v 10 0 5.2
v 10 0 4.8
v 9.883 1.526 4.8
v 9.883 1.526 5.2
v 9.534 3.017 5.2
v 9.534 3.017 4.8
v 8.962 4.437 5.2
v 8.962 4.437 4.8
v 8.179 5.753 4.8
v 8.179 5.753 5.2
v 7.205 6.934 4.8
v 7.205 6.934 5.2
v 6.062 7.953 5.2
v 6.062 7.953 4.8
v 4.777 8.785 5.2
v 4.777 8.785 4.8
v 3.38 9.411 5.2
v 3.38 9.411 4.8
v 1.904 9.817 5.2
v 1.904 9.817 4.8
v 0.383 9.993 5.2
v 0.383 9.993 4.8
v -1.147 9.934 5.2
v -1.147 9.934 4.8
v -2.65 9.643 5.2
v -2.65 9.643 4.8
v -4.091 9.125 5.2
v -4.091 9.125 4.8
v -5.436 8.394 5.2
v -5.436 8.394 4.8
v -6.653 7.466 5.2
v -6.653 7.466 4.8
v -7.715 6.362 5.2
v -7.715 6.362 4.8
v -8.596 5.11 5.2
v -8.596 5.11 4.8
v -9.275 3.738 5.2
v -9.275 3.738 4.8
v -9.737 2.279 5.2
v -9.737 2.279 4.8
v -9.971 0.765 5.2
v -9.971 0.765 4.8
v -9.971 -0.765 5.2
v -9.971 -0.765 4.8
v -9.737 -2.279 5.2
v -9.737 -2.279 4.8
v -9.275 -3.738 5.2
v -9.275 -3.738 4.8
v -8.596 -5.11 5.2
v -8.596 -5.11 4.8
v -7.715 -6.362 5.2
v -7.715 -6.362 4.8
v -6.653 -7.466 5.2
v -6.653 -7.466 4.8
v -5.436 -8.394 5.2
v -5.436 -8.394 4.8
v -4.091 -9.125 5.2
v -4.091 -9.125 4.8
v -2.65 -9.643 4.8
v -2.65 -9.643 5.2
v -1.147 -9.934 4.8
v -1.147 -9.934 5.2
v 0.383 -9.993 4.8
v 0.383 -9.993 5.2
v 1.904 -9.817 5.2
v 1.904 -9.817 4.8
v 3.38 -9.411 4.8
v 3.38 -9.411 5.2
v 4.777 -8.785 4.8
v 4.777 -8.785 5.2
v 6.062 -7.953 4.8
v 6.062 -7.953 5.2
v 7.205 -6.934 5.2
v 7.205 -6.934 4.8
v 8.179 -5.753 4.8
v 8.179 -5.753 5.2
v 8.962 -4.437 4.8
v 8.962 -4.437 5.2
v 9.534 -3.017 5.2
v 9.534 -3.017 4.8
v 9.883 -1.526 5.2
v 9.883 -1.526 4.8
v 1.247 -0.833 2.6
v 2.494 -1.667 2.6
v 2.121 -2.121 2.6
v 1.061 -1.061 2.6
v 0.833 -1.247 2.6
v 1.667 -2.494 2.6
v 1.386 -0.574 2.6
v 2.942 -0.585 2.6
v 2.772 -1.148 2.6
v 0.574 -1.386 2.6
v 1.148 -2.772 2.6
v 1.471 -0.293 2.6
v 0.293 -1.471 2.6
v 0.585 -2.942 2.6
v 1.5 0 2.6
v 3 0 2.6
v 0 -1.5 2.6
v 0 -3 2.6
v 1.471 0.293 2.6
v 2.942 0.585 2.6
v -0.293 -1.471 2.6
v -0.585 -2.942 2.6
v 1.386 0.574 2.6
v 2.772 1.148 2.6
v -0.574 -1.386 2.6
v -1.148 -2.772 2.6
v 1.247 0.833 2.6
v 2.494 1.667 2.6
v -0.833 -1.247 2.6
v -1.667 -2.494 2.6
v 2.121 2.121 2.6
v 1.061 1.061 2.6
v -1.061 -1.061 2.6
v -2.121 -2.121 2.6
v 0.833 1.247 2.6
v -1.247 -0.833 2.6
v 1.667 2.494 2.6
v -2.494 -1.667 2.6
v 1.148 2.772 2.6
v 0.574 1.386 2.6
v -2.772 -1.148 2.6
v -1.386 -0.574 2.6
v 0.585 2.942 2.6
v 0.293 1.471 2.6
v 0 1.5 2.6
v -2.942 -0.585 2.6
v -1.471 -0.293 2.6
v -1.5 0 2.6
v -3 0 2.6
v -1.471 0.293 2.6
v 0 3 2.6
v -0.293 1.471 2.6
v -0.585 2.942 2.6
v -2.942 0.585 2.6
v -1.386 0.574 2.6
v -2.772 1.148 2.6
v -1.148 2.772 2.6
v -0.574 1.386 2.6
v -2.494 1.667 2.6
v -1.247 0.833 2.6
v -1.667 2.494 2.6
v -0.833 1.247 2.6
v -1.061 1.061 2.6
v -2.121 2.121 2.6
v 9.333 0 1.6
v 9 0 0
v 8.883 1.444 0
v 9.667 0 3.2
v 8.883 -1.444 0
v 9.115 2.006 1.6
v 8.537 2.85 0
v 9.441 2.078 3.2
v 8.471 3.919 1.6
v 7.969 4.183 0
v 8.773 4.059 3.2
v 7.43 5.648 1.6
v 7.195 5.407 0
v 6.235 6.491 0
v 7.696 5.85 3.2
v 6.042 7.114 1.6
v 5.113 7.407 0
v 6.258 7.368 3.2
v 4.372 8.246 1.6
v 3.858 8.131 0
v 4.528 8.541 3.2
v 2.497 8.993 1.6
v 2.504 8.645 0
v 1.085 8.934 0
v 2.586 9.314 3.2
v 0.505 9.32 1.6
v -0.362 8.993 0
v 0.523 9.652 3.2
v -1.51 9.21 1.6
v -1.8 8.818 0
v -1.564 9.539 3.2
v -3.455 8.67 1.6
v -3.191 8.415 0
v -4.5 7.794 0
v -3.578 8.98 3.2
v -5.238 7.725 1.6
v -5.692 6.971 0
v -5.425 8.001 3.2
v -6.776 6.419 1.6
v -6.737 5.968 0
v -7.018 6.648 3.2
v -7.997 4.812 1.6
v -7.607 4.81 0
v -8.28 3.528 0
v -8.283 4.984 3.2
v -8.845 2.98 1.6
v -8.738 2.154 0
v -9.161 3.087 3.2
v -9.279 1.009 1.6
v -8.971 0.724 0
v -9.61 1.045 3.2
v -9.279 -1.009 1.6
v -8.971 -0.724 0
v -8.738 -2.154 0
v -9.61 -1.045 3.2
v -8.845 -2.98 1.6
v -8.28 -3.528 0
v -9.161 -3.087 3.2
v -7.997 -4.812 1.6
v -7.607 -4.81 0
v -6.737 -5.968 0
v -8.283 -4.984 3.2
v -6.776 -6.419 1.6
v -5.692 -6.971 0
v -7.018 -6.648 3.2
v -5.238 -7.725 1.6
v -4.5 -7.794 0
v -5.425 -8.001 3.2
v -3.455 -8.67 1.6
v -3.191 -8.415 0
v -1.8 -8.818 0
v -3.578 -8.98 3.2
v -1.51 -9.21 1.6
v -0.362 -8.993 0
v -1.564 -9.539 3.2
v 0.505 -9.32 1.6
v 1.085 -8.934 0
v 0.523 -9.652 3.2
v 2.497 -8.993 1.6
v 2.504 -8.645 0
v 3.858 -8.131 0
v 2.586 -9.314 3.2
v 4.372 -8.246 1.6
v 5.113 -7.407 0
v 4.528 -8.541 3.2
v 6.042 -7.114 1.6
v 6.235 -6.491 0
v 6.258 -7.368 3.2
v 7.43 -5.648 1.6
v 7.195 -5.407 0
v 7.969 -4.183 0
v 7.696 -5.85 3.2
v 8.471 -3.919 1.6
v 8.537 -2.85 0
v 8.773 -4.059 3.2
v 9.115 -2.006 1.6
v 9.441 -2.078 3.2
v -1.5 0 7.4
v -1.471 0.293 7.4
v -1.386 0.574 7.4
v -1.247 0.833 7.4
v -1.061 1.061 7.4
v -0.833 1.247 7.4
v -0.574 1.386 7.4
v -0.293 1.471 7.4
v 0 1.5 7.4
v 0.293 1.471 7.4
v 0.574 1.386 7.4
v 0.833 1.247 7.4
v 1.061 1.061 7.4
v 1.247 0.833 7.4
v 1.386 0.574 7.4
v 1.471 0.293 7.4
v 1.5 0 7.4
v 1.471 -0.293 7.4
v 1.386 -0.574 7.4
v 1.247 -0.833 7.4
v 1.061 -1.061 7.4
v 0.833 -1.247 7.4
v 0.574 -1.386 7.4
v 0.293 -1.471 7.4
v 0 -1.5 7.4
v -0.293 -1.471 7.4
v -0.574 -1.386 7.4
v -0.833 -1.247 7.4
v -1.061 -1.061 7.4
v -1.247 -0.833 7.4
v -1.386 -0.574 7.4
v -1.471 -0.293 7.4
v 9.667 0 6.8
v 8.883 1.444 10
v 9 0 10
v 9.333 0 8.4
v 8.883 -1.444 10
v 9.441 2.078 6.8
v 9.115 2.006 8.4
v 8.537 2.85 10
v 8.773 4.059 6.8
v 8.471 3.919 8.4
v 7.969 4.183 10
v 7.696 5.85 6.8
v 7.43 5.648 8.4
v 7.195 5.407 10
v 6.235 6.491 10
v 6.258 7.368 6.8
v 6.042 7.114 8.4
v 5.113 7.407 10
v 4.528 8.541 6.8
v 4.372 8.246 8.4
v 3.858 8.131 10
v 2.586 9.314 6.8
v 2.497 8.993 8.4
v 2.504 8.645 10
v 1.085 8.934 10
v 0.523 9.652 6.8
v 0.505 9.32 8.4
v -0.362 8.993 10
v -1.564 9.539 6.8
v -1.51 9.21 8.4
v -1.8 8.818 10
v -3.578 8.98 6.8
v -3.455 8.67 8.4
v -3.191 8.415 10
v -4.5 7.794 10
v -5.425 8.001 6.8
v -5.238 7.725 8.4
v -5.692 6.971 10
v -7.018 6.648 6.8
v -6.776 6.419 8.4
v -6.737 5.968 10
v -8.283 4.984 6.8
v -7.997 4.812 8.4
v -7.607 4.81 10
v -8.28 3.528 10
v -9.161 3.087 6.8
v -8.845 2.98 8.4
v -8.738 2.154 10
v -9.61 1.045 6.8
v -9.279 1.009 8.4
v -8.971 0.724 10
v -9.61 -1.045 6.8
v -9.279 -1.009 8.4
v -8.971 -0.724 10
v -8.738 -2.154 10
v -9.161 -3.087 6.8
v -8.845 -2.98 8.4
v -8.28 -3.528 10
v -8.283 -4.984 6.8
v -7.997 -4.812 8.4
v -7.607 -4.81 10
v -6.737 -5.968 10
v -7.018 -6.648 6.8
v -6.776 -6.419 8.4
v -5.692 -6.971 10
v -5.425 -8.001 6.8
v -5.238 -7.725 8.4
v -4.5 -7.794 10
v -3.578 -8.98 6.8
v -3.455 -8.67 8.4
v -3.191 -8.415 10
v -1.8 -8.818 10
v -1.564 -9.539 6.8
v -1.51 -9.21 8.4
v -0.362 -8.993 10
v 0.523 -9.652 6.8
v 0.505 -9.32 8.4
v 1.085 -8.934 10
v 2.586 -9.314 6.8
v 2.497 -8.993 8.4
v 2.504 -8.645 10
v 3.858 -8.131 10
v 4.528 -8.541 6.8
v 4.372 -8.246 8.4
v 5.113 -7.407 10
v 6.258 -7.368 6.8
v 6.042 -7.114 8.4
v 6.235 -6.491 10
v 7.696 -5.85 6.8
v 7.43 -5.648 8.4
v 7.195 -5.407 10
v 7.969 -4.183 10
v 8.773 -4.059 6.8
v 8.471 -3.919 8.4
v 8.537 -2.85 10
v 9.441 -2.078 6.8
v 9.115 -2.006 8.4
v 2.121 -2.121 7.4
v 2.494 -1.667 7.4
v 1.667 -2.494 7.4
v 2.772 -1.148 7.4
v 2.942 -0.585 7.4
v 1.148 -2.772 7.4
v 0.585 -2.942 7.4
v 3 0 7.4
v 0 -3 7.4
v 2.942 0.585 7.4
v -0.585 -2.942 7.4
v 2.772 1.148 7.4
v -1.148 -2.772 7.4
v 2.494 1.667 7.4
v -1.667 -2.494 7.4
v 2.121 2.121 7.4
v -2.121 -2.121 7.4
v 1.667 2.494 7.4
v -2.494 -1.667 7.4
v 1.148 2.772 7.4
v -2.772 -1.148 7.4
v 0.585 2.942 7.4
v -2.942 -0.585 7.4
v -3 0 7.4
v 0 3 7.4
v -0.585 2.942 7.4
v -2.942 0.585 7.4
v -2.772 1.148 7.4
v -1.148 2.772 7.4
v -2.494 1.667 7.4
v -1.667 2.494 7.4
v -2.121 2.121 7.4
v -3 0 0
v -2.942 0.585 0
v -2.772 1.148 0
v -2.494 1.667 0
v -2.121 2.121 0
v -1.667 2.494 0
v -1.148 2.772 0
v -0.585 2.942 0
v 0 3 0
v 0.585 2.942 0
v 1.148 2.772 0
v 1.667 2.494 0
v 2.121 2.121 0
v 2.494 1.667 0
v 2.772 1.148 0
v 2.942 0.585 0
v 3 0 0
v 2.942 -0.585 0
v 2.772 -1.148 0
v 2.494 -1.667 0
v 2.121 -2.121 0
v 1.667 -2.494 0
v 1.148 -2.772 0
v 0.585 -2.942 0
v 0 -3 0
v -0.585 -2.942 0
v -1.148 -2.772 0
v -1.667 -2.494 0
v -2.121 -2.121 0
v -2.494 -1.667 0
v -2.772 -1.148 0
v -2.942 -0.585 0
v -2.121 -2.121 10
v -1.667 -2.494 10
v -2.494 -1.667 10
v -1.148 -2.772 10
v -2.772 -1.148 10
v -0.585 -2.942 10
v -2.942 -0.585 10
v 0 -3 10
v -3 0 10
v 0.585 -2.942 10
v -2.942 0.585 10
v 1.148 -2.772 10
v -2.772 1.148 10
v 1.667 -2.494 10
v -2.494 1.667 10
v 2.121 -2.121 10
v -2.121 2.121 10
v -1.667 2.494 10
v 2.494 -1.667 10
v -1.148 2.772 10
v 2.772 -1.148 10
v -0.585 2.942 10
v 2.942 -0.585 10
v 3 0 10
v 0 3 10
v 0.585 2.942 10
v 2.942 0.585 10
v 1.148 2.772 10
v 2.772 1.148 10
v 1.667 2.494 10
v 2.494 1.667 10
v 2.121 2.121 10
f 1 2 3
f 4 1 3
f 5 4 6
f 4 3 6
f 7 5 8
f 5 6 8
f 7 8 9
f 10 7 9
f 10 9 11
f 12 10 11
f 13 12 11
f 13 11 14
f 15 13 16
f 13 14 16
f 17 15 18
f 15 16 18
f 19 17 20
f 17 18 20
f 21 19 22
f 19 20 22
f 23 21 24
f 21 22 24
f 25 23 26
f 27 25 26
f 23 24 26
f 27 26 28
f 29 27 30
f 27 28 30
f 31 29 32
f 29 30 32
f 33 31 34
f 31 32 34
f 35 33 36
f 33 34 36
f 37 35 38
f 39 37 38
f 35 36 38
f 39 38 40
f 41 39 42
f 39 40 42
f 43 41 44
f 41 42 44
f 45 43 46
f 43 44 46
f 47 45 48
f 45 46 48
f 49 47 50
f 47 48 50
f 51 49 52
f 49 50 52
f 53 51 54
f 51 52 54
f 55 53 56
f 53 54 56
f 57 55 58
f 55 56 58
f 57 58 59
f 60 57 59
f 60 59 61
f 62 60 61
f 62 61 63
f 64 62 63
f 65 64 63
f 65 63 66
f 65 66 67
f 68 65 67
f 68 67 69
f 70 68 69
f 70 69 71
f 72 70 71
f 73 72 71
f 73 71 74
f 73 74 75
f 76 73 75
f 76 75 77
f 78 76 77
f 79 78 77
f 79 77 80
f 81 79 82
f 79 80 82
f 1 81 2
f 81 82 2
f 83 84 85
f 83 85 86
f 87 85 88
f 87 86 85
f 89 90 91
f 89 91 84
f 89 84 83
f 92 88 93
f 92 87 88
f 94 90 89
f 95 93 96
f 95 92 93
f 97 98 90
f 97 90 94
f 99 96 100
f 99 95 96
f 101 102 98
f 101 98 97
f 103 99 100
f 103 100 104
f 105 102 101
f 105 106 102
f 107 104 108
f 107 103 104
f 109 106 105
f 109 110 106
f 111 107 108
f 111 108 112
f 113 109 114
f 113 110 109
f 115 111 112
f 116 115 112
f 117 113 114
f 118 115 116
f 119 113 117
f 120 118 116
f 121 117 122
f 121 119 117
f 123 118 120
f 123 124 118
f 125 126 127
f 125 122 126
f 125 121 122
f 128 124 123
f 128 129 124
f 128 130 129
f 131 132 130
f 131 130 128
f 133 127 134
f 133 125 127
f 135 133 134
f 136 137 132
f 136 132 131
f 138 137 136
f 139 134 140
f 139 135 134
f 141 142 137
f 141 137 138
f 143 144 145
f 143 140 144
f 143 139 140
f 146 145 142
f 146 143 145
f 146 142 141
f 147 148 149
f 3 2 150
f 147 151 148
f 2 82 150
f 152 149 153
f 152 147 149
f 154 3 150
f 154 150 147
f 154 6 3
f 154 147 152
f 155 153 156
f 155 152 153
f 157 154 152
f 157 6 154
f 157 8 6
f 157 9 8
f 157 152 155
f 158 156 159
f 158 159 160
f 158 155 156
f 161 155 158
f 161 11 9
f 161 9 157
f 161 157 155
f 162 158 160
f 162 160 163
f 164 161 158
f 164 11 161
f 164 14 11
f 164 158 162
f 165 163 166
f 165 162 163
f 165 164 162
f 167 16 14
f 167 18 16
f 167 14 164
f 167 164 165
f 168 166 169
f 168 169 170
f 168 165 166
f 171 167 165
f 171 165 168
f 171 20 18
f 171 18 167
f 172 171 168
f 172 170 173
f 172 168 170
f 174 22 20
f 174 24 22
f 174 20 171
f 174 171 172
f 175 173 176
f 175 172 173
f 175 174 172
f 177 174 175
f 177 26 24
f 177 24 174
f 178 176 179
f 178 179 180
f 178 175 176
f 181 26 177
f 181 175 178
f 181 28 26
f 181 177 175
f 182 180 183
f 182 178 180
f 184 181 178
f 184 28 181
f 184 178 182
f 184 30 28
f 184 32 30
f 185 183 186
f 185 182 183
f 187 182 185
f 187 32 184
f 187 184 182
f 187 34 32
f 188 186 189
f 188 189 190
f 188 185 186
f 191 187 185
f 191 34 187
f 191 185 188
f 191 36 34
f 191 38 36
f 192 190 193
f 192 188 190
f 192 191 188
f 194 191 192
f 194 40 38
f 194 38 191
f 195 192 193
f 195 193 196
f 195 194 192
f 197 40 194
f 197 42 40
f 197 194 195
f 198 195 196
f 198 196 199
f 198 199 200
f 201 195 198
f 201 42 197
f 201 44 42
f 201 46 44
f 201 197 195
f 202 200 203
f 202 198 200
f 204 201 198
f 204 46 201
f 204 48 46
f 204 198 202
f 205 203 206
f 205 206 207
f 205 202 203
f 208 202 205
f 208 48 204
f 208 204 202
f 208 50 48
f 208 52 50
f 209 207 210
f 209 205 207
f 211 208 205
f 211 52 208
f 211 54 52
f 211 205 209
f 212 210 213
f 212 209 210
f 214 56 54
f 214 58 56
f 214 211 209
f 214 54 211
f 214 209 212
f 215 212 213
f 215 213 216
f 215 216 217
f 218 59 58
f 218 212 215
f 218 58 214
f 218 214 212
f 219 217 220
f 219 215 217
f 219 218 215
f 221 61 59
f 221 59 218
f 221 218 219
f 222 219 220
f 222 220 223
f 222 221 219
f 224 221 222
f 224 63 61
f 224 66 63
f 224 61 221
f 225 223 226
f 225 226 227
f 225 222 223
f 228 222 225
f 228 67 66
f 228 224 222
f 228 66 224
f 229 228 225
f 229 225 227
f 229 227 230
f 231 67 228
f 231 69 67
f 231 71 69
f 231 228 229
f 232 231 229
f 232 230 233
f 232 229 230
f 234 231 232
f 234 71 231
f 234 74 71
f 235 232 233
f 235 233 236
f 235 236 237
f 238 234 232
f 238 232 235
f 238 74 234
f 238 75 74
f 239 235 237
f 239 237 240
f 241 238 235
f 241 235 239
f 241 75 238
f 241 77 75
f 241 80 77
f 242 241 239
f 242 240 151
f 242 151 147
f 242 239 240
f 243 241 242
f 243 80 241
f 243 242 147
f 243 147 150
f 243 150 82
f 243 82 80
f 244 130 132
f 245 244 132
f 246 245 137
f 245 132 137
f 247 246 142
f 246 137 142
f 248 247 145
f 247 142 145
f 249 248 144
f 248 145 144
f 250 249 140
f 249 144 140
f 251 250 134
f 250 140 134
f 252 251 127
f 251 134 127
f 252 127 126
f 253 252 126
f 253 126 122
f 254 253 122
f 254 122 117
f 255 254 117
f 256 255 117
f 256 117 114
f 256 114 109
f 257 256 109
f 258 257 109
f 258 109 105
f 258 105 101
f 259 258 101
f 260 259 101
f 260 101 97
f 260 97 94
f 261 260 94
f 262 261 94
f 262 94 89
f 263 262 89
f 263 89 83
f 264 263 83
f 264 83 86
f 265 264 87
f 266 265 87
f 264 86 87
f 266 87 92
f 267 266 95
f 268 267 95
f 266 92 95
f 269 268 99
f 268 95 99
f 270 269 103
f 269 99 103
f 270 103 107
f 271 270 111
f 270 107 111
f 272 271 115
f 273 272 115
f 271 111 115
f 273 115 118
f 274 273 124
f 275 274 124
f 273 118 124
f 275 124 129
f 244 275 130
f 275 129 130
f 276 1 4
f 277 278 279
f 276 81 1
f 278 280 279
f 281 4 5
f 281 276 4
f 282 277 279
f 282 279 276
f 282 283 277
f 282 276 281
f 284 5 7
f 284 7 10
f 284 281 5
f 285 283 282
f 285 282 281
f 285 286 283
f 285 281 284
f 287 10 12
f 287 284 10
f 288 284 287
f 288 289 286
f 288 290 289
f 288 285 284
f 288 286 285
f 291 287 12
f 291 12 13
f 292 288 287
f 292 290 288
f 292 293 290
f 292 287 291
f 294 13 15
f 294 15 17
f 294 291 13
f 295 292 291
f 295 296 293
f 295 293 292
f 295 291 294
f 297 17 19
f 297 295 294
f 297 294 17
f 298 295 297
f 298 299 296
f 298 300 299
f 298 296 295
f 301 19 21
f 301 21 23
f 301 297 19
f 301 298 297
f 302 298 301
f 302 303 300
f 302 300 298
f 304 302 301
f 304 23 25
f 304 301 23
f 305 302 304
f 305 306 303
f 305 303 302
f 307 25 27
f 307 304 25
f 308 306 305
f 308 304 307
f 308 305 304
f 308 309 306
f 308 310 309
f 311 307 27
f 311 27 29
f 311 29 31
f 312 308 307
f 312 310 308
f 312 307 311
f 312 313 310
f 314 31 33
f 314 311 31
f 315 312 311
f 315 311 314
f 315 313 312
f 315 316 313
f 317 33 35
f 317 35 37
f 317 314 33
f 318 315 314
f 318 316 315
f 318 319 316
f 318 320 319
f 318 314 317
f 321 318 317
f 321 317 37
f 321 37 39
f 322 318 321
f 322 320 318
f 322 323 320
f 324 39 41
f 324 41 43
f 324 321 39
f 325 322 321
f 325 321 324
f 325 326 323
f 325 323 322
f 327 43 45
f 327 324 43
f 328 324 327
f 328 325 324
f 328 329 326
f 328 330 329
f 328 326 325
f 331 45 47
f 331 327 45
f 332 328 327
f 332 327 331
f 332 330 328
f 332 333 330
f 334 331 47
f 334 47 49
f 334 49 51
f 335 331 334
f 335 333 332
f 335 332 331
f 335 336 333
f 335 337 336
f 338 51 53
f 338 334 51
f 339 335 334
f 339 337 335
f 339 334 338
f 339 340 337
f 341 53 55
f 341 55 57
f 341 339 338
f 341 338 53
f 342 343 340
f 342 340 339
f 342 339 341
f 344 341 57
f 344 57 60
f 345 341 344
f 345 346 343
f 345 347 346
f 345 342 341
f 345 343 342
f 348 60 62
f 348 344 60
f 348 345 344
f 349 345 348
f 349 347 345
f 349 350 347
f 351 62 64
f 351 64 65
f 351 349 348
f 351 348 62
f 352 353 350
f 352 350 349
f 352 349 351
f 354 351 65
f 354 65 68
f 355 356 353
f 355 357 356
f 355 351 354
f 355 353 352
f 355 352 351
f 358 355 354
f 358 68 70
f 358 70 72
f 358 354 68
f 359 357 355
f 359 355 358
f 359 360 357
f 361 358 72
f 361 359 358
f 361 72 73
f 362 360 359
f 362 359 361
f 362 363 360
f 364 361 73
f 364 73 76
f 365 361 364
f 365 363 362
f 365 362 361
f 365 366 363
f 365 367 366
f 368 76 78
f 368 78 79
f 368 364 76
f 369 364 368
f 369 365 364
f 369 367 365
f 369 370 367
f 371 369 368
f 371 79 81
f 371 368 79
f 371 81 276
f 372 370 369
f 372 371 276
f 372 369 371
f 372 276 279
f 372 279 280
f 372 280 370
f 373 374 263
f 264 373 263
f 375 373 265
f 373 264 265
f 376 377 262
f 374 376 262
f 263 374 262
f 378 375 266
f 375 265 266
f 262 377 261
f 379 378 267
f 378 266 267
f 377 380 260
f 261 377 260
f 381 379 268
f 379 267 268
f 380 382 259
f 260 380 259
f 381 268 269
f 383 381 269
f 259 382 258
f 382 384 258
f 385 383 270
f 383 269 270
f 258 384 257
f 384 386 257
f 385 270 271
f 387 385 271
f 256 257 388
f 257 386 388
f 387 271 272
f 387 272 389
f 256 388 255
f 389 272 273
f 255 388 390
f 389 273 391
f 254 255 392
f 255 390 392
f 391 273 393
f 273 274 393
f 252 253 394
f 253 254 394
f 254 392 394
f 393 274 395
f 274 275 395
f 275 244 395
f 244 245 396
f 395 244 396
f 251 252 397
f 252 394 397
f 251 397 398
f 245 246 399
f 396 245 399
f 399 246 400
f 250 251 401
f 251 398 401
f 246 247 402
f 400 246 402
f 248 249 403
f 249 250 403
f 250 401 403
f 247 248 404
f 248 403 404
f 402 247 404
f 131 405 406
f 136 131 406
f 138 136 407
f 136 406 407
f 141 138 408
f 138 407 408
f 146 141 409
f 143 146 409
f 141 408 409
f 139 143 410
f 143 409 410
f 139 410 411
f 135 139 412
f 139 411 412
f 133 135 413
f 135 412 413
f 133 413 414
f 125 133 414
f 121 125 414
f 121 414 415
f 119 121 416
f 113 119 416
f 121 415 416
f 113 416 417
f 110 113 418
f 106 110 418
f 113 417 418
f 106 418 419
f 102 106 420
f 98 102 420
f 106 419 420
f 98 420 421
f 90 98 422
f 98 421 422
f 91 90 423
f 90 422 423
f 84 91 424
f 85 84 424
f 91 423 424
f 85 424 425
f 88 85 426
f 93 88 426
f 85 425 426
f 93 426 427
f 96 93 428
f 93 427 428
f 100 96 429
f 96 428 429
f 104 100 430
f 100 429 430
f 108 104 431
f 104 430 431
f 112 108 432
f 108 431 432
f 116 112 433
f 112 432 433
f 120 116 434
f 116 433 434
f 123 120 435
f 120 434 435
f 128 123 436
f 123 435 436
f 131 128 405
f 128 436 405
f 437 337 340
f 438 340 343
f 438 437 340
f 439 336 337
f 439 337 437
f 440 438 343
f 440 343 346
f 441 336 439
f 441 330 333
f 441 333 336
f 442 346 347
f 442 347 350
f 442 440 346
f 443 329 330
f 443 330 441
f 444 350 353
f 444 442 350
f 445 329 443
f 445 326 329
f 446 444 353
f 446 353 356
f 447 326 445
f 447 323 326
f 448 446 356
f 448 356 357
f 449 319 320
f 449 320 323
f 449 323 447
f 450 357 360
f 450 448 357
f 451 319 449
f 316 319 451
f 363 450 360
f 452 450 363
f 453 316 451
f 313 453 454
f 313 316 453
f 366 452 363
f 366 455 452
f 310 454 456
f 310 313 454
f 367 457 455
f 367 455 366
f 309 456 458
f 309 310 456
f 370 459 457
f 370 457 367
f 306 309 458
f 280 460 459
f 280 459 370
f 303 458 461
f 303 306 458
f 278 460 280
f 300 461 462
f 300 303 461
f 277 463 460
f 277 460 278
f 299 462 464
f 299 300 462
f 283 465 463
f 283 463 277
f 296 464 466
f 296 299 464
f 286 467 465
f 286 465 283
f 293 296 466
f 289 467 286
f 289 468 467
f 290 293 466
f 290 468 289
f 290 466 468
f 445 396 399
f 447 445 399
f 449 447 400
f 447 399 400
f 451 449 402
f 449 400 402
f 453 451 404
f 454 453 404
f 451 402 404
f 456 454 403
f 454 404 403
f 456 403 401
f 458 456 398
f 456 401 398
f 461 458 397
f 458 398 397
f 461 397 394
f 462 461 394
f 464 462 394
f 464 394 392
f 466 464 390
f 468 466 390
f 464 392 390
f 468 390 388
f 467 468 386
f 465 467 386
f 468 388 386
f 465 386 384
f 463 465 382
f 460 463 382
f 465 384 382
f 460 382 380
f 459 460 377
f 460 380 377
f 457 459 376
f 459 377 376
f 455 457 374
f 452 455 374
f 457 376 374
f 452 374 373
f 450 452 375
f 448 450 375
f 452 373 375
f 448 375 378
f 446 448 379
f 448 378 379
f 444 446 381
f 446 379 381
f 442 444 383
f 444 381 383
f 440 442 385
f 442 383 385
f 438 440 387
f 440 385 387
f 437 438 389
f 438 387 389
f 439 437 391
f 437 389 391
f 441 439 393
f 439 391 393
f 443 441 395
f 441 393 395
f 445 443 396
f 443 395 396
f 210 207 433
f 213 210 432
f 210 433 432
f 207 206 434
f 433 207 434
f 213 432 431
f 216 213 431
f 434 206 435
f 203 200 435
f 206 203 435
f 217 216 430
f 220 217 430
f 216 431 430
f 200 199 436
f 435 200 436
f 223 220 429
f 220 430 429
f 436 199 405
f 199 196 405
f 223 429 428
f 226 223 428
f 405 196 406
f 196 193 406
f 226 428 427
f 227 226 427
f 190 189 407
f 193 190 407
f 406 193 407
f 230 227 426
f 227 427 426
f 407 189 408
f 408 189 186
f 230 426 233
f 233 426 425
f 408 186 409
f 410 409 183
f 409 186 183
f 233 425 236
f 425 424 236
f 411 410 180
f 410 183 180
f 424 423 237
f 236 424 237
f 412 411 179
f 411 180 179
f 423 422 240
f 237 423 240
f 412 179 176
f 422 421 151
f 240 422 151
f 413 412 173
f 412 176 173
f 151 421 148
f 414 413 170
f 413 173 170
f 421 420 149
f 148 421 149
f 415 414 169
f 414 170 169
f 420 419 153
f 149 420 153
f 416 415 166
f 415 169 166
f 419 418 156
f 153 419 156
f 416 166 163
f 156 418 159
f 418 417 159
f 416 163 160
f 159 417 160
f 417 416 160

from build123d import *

# Parameters (mm, degrees)
SKETCH_1_R          = 10
EXTRUDE_1_DEPTH     = 10
CHAMFER_1_SIZE      = 1
CHAMFER_1_SIZE2     = 4.8
CHAMFER_2_SIZE      = 4.8
CHAMFER_2_SIZE2     = 1
SKETCH_2_R          = 3
CUT_EXTRUDE_1_DEPTH = 2.6
CUT_EXTRUDE_START   = -7.4
SKETCH_2_3_R        = 3
CUT_EXTRUDE_2_DEPTH = 2.6
SKETCH_4_R          = 1.5
CUT_EXTRUDE_3_DEPTH = 16.961202962


with BuildPart() as part:
    # 草图1 → 凸台-拉伸1 (new body)
    with BuildSketch(Plane.XY):
        Circle(SKETCH_1_R)
    extrude(amount=EXTRUDE_1_DEPTH)

    # 倒角1
    chamfer_1_edges = [part.edges().sort_by_distance(p)[0] for p in [
        (-10, 0, 0),
    ]]
    chamfer_1_side = [part.faces().sort_by_distance(p)[0] for p in [
        (0, 0, 0),
    ]]
    chamfer(chamfer_1_edges, length=CHAMFER_1_SIZE, length2=CHAMFER_1_SIZE2, reference=chamfer_1_side[0])

    # 倒角2
    chamfer_2_edges = [part.edges().sort_by_distance(p)[0] for p in [
        (-10, 0, 10),
    ]]
    chamfer_2_side = [part.faces().sort_by_distance(p)[0] for p in [
        (-10, 0, 7.4),
    ]]
    chamfer(chamfer_2_edges, length=CHAMFER_2_SIZE, length2=CHAMFER_2_SIZE2, reference=chamfer_2_side[0])

    # 草图2 → 切除-拉伸1 (cut)
    with BuildSketch(Plane(origin=(0, 0, 0), x_dir=(-1, 0, 0), z_dir=(0, 0, -1))):
        Circle(SKETCH_2_R)
    extrude(amount=-CUT_EXTRUDE_1_DEPTH, mode=Mode.SUBTRACT)

    # 草图2<3> → 切除-拉伸2 (cut)
    with BuildSketch(Plane(origin=(0, 0, 0), x_dir=(-1, 0, 0), z_dir=(0, 0, -1)).offset(CUT_EXTRUDE_START)):
        Circle(SKETCH_2_3_R)
    extrude(amount=-CUT_EXTRUDE_2_DEPTH, mode=Mode.SUBTRACT)

    # 草图4 → 切除-拉伸3 (cut, through all)
    with BuildSketch(Plane(origin=(0, 0, 2.6), x_dir=(-1, 0, 0), z_dir=(0, 0, -1))):
        Circle(SKETCH_4_R)
    extrude(amount=-CUT_EXTRUDE_3_DEPTH, mode=Mode.SUBTRACT)


solid = part.part
